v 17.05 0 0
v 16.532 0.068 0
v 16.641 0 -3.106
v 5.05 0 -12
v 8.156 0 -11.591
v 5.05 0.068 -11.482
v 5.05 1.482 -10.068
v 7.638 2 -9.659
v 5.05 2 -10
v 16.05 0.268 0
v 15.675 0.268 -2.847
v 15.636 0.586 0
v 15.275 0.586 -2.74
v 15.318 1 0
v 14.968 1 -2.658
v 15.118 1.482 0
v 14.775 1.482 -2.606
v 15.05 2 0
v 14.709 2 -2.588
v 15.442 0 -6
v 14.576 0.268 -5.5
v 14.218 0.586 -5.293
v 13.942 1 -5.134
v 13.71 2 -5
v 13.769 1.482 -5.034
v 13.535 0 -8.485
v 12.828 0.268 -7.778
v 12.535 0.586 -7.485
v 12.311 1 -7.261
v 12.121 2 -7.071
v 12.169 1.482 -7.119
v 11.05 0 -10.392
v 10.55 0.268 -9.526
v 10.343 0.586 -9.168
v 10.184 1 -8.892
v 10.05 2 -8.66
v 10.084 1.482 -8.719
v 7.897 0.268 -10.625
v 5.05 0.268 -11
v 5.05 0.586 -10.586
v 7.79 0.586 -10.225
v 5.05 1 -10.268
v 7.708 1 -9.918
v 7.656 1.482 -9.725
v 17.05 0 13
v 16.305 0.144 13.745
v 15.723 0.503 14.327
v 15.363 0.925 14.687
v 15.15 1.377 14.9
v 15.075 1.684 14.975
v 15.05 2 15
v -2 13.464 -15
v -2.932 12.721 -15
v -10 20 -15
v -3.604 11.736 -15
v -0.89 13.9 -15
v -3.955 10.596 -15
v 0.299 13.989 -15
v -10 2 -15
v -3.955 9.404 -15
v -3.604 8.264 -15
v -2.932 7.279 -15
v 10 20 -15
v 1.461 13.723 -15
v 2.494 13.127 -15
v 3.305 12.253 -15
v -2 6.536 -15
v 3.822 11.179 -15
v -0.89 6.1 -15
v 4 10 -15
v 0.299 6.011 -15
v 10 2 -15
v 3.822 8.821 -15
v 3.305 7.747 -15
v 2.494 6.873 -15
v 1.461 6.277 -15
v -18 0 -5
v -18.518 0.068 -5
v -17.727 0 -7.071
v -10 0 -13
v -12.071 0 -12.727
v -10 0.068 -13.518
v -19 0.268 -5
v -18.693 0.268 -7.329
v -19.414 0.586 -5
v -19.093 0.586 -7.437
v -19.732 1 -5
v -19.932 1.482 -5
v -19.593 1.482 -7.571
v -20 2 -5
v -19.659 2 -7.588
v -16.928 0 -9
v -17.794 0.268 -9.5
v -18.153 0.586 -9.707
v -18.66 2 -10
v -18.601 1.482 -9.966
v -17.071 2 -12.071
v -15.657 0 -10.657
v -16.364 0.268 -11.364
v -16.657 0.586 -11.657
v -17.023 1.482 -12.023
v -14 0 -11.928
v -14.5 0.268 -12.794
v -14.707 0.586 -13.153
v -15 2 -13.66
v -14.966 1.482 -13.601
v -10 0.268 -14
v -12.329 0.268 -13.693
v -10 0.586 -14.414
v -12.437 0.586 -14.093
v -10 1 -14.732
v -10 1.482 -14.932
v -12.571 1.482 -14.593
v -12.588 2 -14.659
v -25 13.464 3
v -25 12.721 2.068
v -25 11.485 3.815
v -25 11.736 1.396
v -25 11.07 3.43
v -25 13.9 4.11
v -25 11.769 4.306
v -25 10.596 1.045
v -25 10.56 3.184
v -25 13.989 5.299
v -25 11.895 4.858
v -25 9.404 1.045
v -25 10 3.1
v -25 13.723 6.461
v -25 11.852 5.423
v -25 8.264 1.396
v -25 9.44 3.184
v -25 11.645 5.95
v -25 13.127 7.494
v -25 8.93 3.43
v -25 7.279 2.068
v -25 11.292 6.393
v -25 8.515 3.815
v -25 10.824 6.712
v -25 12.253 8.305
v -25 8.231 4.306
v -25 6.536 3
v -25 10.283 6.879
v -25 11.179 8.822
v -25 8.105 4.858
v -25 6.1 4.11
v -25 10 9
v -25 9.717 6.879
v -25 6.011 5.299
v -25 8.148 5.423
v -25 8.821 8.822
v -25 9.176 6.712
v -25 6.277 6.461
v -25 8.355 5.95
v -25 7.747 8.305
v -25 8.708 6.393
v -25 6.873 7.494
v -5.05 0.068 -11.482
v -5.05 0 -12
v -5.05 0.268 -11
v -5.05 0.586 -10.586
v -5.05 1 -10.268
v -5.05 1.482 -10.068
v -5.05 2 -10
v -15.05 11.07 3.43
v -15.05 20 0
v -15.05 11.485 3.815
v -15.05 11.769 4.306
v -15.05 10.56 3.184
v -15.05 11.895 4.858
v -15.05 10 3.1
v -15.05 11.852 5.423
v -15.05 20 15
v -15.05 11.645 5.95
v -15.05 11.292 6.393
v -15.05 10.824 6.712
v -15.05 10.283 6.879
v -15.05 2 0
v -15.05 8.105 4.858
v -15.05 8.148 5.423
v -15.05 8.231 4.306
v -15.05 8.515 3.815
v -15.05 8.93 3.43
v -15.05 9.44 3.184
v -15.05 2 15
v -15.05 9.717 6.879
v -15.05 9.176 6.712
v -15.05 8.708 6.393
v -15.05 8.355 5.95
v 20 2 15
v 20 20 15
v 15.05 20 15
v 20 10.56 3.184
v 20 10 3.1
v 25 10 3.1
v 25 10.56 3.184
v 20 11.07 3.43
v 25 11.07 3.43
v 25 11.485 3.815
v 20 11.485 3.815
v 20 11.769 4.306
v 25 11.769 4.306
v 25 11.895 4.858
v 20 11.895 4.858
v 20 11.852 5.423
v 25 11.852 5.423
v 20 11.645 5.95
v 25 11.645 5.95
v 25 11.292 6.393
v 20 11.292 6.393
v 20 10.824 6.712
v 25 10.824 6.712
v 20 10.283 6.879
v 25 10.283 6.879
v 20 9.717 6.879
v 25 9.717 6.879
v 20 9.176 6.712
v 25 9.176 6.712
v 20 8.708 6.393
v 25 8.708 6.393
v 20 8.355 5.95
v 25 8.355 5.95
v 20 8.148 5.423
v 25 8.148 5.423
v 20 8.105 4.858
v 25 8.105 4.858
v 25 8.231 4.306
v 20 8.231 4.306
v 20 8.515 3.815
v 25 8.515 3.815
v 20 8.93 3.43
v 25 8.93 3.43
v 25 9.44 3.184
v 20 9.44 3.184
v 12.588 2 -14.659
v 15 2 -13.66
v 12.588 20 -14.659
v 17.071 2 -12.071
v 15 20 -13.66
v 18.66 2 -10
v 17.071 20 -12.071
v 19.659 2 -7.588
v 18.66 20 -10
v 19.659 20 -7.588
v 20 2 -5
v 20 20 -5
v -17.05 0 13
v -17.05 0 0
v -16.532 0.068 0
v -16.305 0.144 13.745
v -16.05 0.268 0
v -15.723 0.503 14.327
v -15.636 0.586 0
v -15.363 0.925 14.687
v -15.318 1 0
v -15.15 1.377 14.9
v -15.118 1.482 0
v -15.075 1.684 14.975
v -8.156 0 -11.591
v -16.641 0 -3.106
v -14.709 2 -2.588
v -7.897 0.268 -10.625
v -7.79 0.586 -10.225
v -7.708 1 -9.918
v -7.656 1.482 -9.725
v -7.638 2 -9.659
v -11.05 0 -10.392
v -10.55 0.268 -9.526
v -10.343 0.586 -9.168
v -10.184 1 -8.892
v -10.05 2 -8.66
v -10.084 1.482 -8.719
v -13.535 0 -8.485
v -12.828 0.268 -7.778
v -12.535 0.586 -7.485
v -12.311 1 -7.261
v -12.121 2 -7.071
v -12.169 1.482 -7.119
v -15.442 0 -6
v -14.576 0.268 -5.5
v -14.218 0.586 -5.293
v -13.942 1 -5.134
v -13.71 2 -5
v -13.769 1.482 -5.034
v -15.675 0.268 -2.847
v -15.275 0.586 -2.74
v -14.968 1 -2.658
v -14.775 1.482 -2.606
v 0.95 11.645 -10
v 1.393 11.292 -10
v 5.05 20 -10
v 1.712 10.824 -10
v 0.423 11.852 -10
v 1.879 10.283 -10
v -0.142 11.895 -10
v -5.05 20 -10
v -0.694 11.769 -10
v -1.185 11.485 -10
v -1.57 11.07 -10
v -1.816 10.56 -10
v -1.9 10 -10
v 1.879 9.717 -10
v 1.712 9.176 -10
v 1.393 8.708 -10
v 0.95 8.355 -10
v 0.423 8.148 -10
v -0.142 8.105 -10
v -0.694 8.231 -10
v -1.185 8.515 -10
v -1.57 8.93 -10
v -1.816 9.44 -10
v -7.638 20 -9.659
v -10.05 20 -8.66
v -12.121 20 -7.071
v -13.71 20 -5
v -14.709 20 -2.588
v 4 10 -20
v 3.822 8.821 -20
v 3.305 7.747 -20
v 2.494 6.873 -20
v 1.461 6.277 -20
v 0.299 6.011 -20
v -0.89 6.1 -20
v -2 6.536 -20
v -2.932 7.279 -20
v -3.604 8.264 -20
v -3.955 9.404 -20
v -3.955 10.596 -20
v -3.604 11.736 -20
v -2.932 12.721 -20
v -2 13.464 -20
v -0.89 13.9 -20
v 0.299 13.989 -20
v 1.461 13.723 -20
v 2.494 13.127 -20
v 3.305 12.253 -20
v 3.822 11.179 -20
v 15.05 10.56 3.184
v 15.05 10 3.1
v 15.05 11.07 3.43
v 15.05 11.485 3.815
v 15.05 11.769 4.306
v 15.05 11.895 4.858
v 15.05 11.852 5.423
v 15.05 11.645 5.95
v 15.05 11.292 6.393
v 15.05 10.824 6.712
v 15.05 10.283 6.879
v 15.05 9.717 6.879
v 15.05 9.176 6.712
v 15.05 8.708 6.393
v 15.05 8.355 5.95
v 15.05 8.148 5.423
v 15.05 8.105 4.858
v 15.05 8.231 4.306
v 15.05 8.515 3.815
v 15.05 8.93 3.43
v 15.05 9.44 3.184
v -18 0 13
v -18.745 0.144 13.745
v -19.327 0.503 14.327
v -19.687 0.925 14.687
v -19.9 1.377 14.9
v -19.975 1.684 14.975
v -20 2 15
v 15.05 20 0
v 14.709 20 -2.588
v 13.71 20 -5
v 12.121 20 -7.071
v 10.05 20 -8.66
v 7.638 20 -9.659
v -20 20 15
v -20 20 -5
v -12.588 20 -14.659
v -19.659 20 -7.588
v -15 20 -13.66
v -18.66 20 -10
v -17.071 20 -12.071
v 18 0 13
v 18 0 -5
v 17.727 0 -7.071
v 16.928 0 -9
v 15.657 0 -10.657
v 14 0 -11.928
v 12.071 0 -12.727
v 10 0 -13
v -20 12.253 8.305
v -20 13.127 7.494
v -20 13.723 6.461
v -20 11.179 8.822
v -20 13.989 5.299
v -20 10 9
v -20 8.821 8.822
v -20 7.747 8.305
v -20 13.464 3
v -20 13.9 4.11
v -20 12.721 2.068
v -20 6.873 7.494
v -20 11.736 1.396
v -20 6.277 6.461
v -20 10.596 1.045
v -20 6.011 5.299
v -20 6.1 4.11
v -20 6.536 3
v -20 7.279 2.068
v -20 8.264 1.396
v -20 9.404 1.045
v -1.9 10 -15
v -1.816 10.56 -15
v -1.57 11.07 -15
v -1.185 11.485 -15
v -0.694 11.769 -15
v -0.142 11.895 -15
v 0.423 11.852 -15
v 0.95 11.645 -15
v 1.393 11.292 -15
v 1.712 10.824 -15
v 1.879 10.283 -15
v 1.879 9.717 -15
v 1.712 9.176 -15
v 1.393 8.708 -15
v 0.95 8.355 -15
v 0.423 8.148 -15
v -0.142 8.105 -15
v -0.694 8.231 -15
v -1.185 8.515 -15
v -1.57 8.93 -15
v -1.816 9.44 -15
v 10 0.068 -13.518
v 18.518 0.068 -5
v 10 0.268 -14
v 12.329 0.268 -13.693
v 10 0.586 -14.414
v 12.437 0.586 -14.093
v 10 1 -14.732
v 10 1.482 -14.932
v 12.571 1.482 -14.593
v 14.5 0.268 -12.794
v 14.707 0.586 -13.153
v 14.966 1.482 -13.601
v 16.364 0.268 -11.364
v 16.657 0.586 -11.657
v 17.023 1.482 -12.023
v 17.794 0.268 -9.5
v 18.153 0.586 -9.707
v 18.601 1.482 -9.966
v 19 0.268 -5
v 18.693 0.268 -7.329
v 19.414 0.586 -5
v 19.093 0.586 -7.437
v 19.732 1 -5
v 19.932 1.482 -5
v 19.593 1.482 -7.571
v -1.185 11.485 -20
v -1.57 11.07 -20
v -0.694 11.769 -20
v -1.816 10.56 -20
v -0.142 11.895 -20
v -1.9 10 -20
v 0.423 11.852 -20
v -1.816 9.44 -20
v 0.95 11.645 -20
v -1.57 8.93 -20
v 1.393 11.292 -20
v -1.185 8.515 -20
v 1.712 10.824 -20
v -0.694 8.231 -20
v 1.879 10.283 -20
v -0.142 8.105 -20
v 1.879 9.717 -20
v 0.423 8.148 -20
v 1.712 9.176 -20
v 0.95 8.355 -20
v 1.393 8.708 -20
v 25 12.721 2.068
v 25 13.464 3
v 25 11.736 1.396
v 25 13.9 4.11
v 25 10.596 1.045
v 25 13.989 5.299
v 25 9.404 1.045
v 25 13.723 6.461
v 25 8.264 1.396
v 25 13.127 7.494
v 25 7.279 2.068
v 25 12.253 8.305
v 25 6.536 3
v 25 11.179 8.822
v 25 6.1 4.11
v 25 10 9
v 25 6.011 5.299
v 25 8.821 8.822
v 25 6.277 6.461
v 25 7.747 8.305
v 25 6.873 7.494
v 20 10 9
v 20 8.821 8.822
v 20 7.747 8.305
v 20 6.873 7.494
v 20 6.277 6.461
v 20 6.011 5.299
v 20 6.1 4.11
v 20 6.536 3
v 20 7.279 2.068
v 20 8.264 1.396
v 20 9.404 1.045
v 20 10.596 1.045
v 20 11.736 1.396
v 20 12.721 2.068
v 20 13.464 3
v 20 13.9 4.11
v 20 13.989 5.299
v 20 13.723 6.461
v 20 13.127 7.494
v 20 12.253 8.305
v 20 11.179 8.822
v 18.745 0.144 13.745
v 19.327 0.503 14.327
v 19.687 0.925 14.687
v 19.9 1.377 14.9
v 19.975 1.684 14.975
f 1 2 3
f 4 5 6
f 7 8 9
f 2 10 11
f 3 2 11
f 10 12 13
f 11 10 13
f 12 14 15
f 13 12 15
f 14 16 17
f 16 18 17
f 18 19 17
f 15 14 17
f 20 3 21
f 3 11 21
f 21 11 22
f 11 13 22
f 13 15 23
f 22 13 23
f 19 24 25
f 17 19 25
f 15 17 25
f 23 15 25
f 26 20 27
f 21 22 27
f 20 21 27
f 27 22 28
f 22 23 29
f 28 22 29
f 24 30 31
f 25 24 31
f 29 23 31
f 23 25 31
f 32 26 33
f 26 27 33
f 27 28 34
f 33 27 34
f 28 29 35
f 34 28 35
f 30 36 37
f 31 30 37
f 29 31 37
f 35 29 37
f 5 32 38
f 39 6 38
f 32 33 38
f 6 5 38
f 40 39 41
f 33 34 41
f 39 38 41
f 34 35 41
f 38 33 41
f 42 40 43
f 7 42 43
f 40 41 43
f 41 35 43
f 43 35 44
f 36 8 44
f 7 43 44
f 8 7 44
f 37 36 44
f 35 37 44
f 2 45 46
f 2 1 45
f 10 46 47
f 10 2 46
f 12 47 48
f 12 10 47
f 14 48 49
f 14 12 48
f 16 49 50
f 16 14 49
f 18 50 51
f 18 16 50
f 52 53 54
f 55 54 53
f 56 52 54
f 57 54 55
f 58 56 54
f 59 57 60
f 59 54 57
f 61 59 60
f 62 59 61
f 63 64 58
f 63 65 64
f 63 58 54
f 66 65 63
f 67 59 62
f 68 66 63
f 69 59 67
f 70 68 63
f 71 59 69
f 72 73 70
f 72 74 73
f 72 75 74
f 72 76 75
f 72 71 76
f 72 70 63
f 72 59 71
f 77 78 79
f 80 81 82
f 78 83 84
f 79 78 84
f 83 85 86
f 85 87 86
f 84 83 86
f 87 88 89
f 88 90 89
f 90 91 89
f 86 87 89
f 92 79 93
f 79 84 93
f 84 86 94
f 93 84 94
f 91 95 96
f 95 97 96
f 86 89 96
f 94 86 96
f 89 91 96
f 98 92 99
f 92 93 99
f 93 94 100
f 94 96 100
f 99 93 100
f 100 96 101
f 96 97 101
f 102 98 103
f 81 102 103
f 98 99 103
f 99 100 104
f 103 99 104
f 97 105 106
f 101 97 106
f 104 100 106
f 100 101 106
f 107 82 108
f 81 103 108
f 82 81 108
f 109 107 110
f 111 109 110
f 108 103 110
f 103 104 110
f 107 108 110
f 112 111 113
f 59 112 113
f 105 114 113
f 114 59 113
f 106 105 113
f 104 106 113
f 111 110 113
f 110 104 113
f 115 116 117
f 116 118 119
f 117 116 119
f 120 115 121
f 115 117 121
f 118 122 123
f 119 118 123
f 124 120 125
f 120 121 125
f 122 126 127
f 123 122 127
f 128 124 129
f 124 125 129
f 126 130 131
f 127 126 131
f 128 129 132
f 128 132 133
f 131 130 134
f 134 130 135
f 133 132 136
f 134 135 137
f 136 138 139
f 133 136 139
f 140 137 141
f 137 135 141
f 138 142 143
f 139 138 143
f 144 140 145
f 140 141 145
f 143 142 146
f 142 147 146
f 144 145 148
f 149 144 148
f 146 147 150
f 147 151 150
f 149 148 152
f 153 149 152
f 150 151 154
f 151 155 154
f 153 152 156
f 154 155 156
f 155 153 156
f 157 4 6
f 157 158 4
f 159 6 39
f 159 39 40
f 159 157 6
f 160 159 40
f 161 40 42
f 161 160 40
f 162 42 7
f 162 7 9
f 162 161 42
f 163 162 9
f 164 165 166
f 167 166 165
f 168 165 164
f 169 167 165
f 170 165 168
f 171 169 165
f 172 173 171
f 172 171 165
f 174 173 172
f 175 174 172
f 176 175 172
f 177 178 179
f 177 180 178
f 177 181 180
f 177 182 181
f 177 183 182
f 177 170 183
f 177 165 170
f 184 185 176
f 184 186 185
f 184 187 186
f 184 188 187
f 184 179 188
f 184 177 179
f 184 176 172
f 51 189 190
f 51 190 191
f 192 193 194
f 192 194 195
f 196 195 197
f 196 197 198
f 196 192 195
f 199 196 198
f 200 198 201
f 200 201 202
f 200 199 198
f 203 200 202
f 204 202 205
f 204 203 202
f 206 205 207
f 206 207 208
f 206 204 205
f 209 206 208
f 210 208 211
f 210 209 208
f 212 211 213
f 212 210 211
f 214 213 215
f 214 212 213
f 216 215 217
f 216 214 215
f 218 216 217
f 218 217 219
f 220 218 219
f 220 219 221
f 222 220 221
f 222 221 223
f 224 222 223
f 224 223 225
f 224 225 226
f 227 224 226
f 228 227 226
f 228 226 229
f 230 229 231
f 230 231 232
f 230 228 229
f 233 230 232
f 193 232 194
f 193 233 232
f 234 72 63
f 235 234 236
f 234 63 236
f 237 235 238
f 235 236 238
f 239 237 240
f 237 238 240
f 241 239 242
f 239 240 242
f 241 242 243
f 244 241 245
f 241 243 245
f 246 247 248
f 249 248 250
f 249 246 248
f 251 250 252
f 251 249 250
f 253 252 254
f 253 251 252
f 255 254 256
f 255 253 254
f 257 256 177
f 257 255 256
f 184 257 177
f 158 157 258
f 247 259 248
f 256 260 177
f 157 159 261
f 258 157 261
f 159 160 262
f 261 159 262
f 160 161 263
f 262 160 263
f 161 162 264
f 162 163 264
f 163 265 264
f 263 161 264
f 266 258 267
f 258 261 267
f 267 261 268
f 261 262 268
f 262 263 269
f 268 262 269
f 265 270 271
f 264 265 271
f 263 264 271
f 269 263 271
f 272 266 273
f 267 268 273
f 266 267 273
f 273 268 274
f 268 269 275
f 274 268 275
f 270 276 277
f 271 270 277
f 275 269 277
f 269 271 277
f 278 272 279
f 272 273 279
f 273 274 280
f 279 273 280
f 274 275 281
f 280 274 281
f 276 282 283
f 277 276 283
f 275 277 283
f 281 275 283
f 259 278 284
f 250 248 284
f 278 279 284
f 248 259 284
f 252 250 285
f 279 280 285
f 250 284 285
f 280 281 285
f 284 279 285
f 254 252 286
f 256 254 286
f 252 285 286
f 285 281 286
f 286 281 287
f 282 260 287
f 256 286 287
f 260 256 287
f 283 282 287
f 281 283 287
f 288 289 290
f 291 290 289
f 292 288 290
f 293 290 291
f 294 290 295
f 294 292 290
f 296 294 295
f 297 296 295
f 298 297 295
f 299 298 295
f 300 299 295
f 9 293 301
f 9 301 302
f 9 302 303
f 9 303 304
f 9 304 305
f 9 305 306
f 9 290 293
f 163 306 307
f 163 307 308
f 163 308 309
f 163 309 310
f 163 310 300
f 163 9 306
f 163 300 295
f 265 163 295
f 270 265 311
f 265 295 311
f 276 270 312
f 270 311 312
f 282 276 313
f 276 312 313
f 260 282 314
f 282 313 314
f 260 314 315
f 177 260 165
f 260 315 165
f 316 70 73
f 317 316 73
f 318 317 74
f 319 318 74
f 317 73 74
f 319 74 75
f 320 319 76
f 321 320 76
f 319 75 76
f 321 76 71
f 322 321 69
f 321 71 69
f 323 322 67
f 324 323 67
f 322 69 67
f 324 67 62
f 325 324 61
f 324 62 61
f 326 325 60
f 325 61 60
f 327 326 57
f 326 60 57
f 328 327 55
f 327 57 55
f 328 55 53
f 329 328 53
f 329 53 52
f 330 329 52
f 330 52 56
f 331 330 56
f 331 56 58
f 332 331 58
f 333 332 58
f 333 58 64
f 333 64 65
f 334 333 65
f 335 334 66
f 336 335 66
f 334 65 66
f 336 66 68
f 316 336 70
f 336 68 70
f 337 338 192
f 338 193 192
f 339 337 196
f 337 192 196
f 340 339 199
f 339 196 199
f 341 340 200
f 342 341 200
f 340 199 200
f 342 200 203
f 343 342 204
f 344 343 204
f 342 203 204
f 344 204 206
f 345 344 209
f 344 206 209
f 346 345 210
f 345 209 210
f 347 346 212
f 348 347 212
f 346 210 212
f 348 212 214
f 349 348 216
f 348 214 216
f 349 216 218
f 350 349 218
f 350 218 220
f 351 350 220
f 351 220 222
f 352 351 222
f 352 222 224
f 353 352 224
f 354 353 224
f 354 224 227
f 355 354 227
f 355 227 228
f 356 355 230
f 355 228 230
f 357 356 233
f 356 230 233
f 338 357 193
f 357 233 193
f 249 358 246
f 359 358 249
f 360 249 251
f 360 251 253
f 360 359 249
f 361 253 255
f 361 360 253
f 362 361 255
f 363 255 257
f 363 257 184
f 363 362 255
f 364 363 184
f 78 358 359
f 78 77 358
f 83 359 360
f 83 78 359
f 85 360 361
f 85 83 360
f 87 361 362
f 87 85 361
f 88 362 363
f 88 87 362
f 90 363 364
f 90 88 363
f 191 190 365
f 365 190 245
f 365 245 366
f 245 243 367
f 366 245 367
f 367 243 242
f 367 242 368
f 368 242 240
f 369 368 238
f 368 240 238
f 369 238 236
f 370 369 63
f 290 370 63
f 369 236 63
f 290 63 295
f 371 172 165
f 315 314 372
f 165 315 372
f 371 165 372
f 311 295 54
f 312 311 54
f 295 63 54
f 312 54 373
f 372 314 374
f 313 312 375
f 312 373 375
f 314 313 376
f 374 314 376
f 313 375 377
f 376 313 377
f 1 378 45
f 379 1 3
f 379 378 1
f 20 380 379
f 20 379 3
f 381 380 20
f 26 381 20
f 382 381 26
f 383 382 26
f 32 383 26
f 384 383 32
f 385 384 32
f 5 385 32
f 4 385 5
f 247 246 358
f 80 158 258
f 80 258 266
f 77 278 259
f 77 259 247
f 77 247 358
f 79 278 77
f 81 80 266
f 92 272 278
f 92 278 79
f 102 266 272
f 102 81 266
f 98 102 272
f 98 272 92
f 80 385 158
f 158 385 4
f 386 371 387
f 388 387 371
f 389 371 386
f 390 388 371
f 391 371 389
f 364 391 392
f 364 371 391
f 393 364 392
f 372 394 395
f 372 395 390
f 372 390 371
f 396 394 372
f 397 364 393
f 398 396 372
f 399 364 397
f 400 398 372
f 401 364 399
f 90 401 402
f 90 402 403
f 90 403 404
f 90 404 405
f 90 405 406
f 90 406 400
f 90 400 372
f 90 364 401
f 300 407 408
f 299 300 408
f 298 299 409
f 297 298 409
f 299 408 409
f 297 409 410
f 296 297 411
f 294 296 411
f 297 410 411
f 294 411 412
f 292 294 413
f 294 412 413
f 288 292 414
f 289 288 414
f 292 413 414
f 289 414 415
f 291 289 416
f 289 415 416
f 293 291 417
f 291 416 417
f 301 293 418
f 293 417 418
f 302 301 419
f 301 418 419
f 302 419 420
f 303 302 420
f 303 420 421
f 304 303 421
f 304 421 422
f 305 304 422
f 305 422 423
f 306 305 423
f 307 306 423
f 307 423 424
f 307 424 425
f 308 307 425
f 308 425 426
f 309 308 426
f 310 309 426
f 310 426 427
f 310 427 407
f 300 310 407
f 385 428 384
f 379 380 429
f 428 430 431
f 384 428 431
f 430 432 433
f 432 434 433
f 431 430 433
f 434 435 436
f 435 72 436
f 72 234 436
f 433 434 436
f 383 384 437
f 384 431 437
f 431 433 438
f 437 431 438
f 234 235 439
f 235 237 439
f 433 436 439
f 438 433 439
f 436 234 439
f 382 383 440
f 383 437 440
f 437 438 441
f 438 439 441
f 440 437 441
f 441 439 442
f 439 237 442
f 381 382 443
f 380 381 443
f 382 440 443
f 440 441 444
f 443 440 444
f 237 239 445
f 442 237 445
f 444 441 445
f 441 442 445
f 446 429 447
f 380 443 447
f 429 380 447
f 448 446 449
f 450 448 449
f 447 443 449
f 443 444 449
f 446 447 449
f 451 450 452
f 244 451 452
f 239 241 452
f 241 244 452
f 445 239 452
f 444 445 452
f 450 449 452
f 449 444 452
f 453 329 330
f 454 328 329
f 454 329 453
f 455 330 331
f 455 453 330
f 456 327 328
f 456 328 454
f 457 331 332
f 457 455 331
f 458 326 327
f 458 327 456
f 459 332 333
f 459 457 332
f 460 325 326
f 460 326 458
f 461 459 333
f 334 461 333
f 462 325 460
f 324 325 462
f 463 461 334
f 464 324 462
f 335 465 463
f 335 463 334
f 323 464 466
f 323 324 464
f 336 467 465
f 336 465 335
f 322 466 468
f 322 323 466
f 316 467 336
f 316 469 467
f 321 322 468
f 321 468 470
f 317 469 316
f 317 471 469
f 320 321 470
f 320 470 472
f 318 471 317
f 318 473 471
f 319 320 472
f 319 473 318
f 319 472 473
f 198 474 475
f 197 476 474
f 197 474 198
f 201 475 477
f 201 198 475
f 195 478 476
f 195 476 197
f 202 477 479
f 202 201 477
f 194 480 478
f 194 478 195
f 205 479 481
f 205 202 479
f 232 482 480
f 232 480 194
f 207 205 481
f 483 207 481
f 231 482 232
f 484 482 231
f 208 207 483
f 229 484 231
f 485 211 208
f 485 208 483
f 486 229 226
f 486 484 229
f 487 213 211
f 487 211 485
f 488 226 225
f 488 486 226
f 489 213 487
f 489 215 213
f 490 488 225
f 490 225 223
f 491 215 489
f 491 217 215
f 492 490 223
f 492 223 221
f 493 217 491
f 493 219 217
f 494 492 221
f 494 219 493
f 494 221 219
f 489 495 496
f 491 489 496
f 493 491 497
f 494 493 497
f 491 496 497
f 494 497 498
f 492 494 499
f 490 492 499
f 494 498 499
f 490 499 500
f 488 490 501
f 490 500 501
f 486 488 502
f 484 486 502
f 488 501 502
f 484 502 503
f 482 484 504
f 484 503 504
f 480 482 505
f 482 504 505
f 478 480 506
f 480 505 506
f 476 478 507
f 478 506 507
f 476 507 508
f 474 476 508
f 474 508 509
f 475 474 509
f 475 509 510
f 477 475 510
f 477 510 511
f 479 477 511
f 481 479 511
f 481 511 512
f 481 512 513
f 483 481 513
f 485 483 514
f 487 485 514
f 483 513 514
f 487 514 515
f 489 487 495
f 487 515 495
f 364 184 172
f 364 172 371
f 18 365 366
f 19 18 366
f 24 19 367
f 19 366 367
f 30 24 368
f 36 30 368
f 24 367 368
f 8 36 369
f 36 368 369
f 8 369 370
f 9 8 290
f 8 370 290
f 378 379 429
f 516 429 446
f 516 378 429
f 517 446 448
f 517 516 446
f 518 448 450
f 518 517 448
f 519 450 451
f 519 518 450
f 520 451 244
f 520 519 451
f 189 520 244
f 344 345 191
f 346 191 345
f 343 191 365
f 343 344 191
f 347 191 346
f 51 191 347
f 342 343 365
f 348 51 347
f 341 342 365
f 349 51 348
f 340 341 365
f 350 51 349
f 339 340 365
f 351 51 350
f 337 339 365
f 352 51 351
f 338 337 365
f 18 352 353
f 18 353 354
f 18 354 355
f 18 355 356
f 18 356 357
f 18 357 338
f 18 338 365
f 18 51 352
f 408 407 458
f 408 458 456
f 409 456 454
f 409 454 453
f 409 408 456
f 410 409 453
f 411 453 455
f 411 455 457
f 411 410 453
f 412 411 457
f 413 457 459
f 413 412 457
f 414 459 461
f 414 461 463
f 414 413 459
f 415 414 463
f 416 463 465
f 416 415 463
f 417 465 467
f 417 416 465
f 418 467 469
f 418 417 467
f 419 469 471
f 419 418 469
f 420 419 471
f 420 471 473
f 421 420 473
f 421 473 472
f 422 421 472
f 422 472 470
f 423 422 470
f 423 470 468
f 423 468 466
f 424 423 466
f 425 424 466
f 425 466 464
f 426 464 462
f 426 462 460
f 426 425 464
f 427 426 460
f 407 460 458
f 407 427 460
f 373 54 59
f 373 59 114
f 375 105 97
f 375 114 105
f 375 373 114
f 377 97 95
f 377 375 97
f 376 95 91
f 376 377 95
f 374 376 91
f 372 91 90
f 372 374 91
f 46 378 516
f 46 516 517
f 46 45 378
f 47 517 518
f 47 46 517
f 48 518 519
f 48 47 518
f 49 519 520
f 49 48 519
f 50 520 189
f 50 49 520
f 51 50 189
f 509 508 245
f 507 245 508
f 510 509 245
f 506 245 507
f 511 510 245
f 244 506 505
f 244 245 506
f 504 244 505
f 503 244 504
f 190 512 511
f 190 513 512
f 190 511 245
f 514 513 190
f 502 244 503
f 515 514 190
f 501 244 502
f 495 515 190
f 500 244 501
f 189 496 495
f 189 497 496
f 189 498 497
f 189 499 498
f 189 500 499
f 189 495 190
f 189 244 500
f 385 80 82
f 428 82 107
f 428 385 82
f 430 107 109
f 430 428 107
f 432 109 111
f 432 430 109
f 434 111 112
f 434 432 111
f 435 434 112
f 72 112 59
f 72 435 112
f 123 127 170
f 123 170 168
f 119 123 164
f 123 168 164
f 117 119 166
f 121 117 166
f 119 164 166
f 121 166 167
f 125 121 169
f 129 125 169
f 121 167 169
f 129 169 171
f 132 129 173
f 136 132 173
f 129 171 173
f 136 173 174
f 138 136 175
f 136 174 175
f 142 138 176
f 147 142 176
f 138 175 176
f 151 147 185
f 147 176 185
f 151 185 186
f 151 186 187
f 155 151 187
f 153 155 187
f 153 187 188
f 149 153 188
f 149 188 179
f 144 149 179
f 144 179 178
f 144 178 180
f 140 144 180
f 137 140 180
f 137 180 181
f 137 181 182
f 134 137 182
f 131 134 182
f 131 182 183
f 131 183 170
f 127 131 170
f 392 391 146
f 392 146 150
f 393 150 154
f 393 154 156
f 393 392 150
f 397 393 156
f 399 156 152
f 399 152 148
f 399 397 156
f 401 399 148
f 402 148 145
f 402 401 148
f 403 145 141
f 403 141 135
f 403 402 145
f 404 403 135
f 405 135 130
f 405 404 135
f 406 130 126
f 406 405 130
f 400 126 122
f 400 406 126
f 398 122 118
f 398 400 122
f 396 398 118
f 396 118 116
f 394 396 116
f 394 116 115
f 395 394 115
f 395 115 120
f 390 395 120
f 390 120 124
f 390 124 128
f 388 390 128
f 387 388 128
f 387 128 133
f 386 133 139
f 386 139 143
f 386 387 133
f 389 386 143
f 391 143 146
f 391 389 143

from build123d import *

# Parameters (mm, degrees)
BOSS_EXTRUDE1_DEPTH = 20
FILLET1_R           = 10
SKETCH2_R           = 4
SKETCH2_R_2         = 1.9
BOSS_EXTRUDE2_DEPTH = 5
SKETCH3_R           = 1.9
CUT_EXTRUDE1_DEPTH  = 52.478150705
SKETCH5_R           = 4
SKETCH5_R_2         = 1.9
BOSS_EXTRUDE3_DEPTH = 5
SKETCH6_R           = 1.9
CUT_EXTRUDE2_DEPTH  = 44.874821937
FILLET2_R           = 2


with BuildPart() as part:
    # Sketch1 → Boss-Extrude1 (new body)
    with BuildSketch(Plane(origin=(0, 0, 0), x_dir=(1, 0, 0), z_dir=(0, 1, 0))):
        Polygon((-20, 15), (20, 15), (20, -15), (15.05, -15), (15.05, 10), (-15.05, 10), (-15.05, -15), (-20, -15), align=None)
    extrude(amount=BOSS_EXTRUDE1_DEPTH)

    # Fillet1
    fillet1_edges = [part.edges().sort_by_distance(p)[0] for p in [
        (-20, 10, -15),
        (20, 10, -15),
        (15.05, 10, -10),
        (-15.05, 10, -10),
    ]]
    fillet(fillet1_edges, radius=FILLET1_R)

    # Sketch2 → Boss-Extrude2 (add)
    with BuildSketch(Plane(origin=(20, 0, 0), x_dir=(0, 0, -1), z_dir=(1, 0, 0))):
        with Locations(Location((-5, 10, 0), (0, 0, 180))):
            Circle(SKETCH2_R)
        with Locations((-5, 10)):
            Circle(SKETCH2_R_2, mode=Mode.SUBTRACT)
    boss_extrude2 = extrude(amount=BOSS_EXTRUDE2_DEPTH)

    # Mirror1: Boss-Extrude2 across plane
    add(boss_extrude2.mirror(Plane(origin=(0, 0, 0), x_dir=(0, 0, 1), z_dir=(1, 0, 0))))

    # Sketch3 → Cut-Extrude1 (cut, through all)
    with BuildSketch(Plane(origin=(20, 0, 0), x_dir=(0, 0, -1), z_dir=(1, 0, 0))):
        with Locations((-5, 10)):
            Circle(SKETCH3_R)
    extrude(amount=-CUT_EXTRUDE1_DEPTH, mode=Mode.SUBTRACT)

    # Sketch5 → Boss-Extrude3 (add)
    with BuildSketch(Plane(origin=(0, 0, -15), x_dir=(-1, 0, 0), z_dir=(0, 0, -1))):
        with Locations(Location((0, 10, 0), (0, 0, 180))):
            Circle(SKETCH5_R)
        with Locations((0, 10)):
            Circle(SKETCH5_R_2, mode=Mode.SUBTRACT)
    extrude(amount=BOSS_EXTRUDE3_DEPTH)

    # Sketch6 → Cut-Extrude2 (cut, through all)
    with BuildSketch(Plane(origin=(0, 0, -15), x_dir=(-1, 0, 0), z_dir=(0, 0, -1))):
        with Locations((0, 10)):
            Circle(SKETCH6_R)
    extrude(amount=-CUT_EXTRUDE2_DEPTH, mode=Mode.SUBTRACT)

    # Fillet2
    fillet2_edges = [part.edges().sort_by_distance(p)[0] for p in [
        (-15.05, 0, 7.5),
        (-17.525, 0, 15),
        (-20, 0, 5),
        (0, 0, -15),
        (15.05, 0, 7.5),
        (0, 0, -10),
        (17.071067812, 0, -12.071067812),
        (-17.071067812, 0, -12.071067812),
        (12.121067812, 0, -7.071067812),
        (-12.121067812, 0, -7.071067812),
        (20, 0, 5),
        (17.525, 0, 15),
    ]]
    fillet(fillet2_edges, radius=FILLET2_R)


solid = part.part
